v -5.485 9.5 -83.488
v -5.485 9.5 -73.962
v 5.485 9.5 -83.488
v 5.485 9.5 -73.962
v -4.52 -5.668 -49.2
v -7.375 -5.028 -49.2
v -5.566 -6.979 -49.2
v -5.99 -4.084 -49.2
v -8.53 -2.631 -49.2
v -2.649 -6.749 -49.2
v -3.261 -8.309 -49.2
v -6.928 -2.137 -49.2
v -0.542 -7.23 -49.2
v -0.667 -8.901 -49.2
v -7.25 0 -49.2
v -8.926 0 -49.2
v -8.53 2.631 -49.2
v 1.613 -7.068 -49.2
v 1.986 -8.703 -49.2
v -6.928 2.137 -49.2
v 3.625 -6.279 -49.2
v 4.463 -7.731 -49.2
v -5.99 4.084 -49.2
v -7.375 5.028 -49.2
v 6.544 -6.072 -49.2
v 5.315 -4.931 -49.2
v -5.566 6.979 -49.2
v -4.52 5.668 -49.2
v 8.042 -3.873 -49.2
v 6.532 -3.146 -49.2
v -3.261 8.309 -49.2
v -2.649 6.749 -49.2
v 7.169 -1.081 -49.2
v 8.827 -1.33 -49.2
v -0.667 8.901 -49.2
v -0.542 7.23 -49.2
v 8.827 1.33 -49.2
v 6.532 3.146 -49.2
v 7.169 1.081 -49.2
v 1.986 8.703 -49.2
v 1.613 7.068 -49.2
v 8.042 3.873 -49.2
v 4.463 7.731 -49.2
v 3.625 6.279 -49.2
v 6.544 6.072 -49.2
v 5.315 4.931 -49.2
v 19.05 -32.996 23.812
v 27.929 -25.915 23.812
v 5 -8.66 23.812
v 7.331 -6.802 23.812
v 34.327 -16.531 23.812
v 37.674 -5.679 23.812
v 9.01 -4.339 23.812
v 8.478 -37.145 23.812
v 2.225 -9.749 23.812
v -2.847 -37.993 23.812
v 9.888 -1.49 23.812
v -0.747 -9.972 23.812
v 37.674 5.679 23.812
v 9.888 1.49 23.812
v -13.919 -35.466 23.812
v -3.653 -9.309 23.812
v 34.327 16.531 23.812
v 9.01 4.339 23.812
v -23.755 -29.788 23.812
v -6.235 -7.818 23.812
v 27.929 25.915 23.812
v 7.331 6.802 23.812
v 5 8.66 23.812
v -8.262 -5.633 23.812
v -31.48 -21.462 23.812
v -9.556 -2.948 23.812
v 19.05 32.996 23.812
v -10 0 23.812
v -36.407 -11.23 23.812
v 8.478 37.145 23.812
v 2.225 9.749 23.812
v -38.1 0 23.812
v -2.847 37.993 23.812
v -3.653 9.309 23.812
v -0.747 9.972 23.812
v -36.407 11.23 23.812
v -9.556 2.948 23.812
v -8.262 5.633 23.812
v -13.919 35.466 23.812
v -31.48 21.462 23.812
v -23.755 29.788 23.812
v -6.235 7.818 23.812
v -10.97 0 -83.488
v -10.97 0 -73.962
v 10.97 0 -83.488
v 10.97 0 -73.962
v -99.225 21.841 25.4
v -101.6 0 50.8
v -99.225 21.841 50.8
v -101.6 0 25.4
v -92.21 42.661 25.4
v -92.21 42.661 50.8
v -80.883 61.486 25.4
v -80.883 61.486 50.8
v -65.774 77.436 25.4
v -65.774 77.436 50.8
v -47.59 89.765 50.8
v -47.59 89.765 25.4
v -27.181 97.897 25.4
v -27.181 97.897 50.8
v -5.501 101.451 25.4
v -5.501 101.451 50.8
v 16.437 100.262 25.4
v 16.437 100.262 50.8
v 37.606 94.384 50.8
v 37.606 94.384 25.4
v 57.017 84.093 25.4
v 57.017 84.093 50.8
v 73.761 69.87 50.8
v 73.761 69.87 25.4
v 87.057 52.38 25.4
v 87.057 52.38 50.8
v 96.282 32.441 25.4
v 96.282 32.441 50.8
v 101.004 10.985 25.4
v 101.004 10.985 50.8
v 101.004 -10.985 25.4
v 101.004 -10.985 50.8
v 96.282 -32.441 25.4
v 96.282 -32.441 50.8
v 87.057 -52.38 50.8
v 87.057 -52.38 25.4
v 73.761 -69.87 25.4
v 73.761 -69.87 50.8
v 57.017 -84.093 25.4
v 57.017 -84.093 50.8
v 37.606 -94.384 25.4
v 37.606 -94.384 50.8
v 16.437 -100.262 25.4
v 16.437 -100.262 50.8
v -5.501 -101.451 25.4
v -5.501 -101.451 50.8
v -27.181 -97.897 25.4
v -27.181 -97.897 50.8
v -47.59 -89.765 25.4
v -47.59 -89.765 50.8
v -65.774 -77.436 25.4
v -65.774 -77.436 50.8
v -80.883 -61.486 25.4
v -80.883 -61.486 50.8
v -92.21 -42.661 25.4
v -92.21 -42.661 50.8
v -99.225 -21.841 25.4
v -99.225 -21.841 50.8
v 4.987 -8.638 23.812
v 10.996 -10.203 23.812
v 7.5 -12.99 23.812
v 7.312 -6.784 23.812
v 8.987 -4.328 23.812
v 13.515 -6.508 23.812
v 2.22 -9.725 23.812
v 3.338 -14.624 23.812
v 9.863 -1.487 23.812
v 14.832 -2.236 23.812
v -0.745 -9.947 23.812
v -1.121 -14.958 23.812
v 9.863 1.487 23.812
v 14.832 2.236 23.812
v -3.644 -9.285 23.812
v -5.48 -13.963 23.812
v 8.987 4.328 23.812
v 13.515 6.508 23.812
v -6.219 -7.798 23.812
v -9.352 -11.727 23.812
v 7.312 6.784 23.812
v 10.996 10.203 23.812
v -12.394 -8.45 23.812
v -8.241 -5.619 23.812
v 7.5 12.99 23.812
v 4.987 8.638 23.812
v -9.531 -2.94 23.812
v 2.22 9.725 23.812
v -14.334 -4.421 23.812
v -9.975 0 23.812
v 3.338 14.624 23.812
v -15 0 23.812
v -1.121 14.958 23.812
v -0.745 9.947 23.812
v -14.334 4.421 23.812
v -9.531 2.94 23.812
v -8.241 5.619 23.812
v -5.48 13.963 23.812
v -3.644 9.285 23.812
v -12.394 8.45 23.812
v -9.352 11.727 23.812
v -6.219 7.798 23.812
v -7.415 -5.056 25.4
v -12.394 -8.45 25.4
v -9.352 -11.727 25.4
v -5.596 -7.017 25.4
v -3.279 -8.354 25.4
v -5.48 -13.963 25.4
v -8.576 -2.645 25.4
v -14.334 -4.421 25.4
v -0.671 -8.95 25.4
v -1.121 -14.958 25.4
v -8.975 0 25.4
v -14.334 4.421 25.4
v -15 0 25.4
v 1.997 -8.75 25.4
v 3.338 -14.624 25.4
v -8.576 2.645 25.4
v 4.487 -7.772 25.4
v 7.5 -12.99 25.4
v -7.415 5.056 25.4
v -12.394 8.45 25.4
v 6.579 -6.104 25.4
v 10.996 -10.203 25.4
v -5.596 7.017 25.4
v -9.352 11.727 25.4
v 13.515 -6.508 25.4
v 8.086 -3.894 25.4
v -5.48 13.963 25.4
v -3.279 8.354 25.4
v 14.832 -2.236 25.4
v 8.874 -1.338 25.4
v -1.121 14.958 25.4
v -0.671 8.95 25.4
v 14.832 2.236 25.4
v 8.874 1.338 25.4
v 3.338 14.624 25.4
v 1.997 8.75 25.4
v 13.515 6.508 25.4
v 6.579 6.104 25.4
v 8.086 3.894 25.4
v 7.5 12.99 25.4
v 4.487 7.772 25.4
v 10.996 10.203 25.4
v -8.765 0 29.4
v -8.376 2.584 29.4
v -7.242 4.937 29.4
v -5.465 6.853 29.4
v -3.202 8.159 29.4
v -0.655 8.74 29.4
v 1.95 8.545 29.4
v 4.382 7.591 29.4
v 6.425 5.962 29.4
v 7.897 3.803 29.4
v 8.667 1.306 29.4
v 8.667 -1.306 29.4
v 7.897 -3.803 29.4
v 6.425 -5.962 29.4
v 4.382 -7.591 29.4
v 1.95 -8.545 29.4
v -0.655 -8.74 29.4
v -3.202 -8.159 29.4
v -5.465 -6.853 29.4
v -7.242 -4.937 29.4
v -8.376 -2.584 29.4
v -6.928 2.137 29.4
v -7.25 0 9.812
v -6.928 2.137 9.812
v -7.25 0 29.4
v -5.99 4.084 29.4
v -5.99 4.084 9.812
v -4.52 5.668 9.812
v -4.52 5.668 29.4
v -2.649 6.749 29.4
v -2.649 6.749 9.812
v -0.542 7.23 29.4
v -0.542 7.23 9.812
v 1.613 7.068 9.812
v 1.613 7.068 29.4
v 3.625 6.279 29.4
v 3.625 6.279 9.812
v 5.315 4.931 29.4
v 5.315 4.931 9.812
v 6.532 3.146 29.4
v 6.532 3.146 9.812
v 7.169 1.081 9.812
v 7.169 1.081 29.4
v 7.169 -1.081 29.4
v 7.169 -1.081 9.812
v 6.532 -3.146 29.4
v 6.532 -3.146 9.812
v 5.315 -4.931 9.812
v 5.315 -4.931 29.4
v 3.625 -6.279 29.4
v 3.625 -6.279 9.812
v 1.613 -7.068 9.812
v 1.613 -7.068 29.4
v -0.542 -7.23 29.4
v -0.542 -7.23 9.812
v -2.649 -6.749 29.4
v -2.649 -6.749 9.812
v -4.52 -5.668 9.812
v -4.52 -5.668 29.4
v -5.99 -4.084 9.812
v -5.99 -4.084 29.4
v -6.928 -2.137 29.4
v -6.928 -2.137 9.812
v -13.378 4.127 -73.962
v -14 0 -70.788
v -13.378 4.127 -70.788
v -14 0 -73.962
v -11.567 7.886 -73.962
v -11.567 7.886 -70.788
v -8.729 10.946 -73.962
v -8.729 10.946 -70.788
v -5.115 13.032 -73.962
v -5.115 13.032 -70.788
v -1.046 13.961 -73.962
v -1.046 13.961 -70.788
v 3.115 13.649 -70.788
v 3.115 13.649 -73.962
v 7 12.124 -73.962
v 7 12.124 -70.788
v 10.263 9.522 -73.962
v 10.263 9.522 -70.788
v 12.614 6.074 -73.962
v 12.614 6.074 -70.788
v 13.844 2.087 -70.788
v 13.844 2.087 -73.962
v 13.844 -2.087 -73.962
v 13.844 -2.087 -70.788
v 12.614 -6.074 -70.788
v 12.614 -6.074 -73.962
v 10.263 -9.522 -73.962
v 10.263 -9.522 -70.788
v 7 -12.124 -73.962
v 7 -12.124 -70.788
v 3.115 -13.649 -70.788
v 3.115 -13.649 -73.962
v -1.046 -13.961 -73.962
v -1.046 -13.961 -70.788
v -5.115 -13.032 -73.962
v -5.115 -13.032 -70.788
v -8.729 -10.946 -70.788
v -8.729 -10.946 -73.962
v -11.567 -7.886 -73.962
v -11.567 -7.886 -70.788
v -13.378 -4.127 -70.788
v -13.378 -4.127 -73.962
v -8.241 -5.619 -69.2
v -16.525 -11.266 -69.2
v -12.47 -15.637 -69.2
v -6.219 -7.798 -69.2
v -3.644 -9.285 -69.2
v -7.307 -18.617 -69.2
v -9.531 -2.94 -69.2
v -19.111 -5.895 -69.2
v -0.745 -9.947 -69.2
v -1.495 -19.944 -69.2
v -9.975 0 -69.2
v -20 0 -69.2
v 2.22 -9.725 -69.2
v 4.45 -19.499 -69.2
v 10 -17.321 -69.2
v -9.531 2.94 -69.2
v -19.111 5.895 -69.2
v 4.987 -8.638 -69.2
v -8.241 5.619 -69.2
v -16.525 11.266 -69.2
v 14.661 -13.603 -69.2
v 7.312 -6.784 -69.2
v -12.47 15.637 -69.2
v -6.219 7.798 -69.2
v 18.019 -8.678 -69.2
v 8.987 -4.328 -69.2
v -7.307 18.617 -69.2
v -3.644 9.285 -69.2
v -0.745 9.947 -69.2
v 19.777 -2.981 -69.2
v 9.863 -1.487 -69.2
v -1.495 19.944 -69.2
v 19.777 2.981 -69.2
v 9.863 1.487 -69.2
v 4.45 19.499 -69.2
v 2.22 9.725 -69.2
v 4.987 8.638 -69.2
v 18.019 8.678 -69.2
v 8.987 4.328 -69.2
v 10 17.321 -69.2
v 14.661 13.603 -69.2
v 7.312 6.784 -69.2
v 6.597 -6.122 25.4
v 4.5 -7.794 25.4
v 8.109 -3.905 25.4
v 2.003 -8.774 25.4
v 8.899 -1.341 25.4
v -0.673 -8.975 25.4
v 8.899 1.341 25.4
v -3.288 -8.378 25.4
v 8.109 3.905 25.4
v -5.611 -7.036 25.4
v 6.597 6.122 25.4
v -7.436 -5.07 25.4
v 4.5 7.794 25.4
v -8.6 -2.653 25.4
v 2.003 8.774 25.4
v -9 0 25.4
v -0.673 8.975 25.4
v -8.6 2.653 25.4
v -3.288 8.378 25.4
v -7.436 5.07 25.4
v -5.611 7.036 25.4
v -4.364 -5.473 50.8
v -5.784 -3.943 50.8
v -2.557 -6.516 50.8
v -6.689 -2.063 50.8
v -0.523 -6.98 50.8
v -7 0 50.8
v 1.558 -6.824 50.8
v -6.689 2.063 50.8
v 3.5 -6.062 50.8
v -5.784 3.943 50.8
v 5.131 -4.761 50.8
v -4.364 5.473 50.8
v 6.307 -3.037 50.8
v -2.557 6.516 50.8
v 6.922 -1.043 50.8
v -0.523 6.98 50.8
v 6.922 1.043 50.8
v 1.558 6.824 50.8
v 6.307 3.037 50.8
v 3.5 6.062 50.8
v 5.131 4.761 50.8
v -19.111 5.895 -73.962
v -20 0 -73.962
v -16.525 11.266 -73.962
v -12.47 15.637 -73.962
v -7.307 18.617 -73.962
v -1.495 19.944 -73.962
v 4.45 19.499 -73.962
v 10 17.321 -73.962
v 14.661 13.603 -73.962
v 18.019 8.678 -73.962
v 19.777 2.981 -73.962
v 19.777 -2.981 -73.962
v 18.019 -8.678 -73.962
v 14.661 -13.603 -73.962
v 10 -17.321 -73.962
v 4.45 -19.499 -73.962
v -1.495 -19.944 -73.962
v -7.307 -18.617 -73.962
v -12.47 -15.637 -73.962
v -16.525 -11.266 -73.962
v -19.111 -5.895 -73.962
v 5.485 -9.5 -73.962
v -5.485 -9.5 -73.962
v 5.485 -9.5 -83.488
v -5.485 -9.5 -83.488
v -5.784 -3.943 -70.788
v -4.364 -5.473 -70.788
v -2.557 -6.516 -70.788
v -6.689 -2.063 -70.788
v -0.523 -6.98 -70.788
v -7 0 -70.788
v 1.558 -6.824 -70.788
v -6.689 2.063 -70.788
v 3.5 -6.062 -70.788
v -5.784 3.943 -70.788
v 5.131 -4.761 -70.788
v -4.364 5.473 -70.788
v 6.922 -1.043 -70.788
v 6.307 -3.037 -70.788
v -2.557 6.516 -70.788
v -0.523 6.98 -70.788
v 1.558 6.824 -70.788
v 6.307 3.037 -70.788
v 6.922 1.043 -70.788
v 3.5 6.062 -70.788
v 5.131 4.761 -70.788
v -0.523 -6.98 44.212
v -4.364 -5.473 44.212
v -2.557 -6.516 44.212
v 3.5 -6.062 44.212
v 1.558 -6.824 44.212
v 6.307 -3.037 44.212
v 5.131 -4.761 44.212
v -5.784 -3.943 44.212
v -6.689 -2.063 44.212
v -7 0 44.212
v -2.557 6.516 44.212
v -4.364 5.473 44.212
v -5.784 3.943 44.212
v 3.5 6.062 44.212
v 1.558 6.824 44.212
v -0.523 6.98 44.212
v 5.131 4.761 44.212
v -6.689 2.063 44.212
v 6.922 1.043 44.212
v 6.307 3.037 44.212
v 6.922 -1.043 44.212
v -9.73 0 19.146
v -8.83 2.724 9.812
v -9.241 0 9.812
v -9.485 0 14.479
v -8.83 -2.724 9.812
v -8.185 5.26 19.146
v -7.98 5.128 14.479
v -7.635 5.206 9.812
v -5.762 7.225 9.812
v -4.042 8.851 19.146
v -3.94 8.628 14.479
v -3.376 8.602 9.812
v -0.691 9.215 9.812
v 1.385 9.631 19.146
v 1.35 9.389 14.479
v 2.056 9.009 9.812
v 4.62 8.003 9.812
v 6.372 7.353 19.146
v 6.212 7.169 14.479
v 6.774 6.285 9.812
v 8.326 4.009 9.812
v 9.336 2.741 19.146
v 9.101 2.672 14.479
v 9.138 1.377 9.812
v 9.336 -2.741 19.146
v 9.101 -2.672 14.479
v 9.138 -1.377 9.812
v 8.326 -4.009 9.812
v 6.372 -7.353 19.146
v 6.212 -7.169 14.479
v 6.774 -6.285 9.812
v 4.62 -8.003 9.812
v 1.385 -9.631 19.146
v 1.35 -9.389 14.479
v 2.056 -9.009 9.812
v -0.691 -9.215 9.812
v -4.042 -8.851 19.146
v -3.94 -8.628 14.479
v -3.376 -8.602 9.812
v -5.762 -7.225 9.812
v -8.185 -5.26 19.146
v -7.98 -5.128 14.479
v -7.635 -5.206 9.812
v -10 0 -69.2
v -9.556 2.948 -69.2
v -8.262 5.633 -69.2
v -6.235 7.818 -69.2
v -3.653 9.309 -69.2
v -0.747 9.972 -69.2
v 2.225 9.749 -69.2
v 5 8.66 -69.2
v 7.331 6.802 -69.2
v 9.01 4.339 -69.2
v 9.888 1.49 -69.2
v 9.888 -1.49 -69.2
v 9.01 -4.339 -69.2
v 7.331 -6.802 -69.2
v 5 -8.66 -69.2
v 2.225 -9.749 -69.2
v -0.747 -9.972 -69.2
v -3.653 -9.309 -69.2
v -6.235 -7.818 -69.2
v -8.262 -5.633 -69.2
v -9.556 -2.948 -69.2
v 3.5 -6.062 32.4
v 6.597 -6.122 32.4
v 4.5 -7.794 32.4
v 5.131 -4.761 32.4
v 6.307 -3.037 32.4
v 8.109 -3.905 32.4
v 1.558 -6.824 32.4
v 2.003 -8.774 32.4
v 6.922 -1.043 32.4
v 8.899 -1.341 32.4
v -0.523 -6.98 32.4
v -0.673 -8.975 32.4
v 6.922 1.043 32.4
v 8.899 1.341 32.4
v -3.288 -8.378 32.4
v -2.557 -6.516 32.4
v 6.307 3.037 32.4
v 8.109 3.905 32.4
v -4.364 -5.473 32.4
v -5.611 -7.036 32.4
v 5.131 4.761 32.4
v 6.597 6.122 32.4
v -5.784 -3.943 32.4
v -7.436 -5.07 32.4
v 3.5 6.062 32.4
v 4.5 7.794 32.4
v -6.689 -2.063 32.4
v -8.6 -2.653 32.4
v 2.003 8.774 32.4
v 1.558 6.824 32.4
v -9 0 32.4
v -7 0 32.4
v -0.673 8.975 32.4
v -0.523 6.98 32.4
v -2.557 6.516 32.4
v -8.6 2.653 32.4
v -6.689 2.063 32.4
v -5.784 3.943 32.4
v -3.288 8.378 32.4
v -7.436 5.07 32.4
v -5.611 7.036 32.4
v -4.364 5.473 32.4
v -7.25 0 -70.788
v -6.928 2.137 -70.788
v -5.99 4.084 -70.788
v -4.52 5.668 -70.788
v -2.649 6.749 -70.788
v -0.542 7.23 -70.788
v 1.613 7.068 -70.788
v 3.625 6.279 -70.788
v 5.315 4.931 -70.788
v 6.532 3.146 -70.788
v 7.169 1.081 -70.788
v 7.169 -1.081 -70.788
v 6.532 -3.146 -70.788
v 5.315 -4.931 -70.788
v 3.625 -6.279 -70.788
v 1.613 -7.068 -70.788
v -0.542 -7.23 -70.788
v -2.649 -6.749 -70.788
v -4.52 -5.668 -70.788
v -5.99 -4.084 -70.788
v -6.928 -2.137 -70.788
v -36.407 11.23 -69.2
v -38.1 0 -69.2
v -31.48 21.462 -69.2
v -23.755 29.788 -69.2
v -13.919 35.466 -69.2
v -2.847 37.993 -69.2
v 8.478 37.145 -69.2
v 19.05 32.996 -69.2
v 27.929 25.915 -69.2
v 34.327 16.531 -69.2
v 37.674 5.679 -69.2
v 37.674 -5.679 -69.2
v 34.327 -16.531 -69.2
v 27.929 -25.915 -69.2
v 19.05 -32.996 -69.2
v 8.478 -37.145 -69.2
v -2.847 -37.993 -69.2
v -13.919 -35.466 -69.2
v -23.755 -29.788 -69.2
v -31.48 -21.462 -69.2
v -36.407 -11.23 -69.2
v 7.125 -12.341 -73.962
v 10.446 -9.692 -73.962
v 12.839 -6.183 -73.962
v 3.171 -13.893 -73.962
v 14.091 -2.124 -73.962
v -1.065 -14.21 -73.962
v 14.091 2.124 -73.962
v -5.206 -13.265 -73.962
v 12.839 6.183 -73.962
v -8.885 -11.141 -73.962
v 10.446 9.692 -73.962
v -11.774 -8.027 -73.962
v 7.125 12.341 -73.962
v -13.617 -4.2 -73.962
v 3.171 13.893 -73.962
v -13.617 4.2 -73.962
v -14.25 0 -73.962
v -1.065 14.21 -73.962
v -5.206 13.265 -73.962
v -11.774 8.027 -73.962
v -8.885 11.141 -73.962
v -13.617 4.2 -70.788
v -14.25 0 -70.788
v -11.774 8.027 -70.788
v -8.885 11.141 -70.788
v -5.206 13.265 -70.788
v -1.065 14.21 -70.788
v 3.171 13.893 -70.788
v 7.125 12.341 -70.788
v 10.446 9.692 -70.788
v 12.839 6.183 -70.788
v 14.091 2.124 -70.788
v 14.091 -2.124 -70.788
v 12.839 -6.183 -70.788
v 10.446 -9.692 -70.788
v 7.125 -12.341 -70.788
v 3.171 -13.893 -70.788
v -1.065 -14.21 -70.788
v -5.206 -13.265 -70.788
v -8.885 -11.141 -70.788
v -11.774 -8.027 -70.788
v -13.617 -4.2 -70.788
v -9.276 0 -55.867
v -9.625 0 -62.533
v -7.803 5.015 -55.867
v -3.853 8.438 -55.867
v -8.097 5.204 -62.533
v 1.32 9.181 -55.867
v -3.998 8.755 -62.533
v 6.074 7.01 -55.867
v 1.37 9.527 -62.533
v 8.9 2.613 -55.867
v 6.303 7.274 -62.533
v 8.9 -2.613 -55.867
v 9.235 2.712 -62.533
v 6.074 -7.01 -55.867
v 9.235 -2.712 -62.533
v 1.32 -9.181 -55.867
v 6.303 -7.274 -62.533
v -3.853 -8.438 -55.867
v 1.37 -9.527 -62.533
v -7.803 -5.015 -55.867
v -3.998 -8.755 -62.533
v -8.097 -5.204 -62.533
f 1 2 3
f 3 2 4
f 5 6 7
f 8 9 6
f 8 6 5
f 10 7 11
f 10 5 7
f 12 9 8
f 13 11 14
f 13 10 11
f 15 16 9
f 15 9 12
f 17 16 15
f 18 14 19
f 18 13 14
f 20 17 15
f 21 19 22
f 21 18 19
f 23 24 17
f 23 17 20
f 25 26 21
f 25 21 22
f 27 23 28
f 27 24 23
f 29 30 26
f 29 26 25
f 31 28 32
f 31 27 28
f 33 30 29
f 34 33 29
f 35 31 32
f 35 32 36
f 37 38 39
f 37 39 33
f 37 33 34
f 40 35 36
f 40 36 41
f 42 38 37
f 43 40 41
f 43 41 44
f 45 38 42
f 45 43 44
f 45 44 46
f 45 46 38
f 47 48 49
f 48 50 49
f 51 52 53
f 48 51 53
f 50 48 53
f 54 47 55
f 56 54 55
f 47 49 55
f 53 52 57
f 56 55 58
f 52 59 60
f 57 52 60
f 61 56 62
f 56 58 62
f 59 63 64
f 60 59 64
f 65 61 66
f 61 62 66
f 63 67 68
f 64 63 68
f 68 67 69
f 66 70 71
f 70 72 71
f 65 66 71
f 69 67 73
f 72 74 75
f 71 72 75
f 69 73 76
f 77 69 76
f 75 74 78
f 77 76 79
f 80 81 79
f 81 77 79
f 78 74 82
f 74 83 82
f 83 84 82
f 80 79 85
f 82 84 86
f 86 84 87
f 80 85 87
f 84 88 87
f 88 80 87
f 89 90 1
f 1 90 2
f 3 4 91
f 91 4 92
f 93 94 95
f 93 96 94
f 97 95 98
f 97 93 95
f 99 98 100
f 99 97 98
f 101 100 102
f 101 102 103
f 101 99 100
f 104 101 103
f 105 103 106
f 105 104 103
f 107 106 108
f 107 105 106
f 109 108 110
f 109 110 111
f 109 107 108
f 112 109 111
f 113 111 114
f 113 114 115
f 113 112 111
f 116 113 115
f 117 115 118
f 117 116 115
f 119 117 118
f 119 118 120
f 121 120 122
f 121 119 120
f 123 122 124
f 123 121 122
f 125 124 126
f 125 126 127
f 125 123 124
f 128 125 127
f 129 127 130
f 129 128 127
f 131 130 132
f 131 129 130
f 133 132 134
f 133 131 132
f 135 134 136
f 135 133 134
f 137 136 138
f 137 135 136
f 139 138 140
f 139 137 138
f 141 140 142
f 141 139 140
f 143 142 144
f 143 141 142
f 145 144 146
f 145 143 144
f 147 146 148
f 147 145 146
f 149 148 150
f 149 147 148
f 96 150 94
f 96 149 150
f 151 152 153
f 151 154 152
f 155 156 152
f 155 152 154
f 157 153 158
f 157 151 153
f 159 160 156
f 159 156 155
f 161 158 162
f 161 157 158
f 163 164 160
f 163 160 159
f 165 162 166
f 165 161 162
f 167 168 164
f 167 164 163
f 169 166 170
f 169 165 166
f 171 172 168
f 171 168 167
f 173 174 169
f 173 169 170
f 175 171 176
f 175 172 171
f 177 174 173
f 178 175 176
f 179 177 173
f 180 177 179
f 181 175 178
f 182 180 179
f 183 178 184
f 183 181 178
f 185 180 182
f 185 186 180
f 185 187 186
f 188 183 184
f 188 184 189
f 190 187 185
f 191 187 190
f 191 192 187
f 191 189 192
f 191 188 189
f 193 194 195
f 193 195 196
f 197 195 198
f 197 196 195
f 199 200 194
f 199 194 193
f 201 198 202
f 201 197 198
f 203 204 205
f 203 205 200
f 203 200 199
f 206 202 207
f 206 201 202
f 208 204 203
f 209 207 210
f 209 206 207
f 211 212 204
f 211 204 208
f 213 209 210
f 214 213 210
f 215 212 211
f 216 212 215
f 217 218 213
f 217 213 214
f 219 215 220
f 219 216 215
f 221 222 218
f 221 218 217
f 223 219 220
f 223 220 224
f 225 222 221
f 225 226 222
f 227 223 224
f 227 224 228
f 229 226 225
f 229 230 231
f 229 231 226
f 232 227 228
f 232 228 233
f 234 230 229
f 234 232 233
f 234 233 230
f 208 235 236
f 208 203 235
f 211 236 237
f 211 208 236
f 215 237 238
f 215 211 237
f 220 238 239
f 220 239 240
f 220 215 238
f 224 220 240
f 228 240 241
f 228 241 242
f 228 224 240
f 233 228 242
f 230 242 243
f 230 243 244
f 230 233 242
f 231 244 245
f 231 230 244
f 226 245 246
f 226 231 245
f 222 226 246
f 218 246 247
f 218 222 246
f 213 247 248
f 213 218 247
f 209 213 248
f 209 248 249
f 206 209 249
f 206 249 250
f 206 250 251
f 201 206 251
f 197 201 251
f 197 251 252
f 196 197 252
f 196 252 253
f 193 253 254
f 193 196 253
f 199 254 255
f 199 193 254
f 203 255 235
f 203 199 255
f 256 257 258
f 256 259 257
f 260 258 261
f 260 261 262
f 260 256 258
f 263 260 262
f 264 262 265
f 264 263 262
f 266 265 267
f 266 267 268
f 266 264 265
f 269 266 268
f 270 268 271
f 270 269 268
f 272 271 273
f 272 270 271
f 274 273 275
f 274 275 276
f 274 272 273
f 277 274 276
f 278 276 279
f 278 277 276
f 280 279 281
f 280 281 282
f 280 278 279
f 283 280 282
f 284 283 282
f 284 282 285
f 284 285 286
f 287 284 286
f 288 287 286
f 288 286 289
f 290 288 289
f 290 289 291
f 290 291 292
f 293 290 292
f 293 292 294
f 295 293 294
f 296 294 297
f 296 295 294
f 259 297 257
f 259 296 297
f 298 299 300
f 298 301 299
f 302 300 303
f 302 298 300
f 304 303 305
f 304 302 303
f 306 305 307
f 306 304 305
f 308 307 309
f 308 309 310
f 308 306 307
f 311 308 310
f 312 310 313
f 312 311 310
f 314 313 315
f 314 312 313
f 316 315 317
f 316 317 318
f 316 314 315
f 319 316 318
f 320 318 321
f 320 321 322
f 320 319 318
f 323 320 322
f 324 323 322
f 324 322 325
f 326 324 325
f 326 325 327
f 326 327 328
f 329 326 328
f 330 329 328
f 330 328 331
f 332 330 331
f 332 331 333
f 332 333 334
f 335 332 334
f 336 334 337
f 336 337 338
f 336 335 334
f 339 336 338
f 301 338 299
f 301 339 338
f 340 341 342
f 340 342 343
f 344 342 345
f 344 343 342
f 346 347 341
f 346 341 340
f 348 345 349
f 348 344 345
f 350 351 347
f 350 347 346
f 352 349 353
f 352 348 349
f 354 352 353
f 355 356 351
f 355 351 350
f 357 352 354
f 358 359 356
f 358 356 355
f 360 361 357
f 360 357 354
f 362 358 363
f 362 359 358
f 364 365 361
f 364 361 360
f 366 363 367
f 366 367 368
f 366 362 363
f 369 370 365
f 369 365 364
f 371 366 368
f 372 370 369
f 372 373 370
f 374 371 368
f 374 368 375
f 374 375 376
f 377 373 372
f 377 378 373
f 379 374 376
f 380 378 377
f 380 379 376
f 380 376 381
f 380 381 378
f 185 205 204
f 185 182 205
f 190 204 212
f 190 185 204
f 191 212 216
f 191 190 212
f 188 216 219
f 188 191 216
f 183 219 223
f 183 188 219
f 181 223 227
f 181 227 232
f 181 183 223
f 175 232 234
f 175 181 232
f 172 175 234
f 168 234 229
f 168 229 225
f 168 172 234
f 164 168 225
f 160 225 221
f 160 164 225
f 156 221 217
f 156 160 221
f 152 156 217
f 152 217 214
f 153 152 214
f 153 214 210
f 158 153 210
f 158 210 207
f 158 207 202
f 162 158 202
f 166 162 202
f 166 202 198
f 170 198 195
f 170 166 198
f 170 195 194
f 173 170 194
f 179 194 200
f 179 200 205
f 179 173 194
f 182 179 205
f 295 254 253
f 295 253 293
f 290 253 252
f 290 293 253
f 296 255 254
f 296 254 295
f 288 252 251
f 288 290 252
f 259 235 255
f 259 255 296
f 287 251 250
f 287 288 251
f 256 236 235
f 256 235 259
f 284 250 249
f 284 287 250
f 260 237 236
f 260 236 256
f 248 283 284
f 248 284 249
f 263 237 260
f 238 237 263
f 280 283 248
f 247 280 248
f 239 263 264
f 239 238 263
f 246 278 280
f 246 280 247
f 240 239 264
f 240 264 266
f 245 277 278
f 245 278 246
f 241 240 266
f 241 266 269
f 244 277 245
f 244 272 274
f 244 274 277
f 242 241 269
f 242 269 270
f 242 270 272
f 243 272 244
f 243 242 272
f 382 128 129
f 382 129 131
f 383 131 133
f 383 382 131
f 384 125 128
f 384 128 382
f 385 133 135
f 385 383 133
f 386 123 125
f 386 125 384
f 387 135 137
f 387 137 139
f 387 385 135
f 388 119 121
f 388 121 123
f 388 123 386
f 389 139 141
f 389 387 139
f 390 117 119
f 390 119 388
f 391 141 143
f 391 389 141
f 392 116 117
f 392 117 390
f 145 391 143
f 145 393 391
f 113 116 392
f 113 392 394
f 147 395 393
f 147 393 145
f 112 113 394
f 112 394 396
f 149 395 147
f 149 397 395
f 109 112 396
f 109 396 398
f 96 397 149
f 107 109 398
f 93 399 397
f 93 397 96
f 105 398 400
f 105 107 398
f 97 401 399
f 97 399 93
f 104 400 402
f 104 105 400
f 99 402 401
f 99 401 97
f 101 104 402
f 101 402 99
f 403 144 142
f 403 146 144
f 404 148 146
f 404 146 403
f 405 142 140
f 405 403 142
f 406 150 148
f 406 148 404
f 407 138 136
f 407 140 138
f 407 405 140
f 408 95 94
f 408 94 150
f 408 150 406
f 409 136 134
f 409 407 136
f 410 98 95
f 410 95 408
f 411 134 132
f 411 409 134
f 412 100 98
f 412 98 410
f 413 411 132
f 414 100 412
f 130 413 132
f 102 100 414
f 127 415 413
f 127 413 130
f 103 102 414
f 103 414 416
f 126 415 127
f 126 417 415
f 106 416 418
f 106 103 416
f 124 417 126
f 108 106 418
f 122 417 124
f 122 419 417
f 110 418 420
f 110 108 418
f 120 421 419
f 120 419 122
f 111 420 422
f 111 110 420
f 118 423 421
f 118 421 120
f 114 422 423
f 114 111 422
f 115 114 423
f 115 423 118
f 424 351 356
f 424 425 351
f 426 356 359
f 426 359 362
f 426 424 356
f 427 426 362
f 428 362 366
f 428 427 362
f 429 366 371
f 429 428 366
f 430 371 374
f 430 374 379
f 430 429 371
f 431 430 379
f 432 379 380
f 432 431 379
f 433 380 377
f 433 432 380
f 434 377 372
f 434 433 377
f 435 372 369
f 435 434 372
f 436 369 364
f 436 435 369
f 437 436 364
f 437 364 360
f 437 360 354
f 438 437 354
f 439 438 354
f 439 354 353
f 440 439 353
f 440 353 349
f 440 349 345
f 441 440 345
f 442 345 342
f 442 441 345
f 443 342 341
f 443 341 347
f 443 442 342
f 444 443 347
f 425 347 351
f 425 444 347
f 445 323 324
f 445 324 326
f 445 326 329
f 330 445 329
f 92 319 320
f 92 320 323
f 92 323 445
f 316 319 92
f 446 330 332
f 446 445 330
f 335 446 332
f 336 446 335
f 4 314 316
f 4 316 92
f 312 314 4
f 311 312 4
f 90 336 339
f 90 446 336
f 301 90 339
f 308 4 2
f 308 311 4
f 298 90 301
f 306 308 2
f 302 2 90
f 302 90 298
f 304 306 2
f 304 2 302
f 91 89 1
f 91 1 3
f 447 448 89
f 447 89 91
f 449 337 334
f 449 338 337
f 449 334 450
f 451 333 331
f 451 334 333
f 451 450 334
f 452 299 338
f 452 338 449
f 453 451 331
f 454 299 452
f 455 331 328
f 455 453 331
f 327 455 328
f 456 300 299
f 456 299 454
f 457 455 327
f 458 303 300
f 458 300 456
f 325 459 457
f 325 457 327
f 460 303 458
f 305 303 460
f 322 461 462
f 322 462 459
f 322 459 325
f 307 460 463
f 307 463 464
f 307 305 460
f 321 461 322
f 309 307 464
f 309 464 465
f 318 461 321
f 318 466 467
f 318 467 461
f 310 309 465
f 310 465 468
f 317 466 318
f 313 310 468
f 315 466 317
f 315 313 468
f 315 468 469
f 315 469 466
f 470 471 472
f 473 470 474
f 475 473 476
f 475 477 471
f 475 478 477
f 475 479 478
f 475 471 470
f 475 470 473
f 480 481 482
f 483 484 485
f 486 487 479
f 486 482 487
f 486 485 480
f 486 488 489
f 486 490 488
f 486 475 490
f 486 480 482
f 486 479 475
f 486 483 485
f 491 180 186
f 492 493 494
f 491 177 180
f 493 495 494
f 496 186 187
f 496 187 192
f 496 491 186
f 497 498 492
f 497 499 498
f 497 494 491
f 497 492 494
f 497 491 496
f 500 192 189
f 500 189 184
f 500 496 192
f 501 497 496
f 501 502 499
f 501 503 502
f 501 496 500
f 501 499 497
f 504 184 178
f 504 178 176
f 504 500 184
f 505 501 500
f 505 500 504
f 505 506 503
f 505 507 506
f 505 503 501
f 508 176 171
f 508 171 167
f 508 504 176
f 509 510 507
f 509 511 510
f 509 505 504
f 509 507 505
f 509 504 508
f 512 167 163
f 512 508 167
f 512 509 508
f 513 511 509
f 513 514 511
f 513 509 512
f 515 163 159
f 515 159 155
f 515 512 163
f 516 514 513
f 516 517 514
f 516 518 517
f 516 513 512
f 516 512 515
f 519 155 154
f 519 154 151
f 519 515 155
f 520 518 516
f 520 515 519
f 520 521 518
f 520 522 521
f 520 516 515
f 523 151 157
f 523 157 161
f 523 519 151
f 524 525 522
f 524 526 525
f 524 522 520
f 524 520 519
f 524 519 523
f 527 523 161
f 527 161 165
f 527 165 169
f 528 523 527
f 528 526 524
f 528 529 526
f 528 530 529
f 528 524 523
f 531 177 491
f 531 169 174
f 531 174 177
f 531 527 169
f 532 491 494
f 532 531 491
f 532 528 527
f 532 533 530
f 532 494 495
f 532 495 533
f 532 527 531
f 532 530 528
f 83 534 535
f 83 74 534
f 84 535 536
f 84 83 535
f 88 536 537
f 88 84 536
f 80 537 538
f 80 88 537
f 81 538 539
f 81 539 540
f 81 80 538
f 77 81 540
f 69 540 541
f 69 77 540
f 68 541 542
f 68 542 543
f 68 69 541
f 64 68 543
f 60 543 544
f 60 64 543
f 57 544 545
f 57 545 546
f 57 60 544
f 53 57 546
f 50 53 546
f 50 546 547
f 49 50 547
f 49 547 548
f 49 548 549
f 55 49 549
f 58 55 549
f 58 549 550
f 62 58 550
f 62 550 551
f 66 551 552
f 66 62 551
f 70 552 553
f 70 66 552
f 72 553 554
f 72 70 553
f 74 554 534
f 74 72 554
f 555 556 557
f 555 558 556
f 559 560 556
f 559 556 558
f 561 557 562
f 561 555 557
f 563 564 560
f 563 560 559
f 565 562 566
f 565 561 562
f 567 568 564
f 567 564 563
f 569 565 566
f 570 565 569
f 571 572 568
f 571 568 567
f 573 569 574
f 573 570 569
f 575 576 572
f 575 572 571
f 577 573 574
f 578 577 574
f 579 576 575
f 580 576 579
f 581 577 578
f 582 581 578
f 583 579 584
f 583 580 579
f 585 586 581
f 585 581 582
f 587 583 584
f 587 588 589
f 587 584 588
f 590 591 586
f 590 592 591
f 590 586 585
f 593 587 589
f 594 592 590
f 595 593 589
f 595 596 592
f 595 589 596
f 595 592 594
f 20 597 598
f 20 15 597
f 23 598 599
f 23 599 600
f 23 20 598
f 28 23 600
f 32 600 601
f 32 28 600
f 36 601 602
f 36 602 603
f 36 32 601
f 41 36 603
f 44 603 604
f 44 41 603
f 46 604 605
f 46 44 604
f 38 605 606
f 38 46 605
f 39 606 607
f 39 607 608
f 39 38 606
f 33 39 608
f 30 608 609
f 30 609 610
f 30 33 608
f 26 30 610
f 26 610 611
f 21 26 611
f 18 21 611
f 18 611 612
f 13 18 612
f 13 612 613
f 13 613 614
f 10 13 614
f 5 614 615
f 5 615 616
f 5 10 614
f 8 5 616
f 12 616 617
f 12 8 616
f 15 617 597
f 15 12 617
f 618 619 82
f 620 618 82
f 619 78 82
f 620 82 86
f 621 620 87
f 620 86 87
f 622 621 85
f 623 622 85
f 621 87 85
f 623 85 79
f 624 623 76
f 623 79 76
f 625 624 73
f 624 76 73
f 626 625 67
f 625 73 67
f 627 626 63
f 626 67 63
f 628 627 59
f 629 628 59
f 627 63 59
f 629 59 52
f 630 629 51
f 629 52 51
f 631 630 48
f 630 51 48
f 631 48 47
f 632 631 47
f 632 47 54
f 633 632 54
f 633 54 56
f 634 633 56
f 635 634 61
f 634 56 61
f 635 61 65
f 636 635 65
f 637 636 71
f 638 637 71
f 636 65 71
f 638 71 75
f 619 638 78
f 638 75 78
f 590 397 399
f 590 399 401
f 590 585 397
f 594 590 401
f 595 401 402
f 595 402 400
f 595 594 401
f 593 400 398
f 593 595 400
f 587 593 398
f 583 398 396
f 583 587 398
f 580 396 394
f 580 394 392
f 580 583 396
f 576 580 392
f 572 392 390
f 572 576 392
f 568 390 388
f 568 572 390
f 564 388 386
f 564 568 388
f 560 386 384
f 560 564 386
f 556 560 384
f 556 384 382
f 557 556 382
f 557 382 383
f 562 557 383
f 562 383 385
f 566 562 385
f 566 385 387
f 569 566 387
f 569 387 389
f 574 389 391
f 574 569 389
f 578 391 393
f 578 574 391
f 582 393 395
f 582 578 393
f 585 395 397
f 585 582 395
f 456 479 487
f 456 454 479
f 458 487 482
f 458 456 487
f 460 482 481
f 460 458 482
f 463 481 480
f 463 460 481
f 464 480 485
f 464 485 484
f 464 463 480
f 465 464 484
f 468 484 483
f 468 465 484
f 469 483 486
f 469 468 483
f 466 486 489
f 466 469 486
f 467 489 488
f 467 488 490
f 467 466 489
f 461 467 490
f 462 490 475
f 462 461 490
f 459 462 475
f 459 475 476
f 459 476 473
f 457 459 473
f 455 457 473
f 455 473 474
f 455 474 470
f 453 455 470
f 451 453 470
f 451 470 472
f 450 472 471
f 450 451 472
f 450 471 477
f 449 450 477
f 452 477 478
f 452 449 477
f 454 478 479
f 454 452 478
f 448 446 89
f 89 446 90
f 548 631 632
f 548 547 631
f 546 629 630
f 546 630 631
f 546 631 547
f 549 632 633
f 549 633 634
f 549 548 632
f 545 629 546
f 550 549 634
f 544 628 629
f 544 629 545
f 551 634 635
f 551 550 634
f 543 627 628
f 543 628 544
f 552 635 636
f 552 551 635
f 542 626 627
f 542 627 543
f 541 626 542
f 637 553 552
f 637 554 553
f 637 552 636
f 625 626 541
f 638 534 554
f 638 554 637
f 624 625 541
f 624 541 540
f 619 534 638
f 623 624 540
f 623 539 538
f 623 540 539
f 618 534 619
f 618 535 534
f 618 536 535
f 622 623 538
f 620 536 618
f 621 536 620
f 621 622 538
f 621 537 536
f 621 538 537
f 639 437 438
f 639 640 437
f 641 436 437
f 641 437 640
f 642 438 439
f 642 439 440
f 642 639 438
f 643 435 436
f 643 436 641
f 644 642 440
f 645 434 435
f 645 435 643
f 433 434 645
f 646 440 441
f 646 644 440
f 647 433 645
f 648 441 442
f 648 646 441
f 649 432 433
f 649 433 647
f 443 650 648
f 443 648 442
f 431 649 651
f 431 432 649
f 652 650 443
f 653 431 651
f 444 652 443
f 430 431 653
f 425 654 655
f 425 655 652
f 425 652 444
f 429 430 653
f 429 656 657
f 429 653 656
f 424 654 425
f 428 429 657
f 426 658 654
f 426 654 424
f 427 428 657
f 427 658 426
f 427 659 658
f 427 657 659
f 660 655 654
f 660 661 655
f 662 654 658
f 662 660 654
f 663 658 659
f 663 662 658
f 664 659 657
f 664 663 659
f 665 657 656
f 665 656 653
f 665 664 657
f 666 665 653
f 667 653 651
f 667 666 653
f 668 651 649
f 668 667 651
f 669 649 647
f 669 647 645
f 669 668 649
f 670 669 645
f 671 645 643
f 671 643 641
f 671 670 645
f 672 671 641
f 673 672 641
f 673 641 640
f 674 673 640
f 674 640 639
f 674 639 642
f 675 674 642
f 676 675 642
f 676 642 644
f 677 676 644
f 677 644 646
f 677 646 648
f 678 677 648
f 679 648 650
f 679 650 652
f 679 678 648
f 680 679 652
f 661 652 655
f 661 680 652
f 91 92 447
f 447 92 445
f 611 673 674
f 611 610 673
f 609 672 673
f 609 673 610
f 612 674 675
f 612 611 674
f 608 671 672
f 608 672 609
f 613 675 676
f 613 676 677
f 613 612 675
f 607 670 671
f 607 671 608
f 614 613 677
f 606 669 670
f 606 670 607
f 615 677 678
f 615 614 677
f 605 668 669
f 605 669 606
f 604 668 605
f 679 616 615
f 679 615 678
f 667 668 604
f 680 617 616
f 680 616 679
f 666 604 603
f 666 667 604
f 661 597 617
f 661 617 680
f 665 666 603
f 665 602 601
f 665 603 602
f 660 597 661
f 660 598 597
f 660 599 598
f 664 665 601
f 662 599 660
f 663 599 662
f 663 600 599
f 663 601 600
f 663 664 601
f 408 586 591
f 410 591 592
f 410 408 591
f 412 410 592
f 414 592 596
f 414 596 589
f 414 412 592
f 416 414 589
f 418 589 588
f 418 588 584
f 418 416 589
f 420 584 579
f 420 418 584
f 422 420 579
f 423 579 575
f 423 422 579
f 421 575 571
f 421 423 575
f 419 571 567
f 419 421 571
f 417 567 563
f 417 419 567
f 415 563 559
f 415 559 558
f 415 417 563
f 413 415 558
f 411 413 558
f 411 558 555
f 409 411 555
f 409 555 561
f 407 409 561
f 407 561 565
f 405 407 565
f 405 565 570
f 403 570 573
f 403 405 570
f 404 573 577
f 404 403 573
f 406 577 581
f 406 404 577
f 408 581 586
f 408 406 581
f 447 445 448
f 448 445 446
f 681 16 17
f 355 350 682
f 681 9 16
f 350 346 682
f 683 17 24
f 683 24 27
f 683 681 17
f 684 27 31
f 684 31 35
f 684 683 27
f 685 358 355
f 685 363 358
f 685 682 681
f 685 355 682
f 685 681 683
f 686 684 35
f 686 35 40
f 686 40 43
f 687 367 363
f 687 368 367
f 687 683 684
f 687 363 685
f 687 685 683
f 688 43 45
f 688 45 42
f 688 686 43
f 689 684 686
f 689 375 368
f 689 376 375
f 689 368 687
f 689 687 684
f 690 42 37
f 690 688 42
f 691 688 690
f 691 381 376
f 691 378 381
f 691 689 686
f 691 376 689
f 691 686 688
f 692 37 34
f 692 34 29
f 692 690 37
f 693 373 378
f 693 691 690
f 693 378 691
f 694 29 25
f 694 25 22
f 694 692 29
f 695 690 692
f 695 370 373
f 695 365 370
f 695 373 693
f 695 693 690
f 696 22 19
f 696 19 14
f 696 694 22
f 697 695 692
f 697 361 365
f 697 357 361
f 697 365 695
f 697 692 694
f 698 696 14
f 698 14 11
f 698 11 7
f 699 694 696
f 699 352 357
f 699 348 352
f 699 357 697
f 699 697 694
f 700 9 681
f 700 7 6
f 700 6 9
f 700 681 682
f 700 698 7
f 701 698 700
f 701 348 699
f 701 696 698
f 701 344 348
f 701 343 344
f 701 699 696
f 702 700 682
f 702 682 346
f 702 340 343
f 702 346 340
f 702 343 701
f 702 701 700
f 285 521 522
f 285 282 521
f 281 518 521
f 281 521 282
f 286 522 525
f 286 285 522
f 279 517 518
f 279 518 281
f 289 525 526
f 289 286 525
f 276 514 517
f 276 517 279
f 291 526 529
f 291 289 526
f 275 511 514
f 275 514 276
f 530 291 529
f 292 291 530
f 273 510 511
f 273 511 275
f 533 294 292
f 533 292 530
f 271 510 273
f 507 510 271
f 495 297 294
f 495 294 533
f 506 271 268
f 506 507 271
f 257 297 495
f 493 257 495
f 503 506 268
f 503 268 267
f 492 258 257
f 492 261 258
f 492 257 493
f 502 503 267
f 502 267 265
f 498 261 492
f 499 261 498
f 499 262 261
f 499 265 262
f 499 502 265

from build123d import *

# Parameters (mm, degrees)
F2_W     = 28.1
F2_H     = 93.0125
F7_DEPTH = 9.525


with BuildPart() as f1:
    # F0 (on Front) → F1 (revolve)
    with BuildSketch(Plane.XZ):
        Polygon((-7, 50.8), (-101.6, 50.8), (-101.6, 25.4), (-9, 25.4), (-9, 32.4), (-7, 32.4), align=None)
    revolve(axis=Axis((0, 0, 0), (0, 0, -1)))


with BuildPart() as f3:
    # F2 (on Front) → F3 (revolve)
    with BuildSketch(Plane.XZ):
        with Locations((-24.05, -22.69375)):
            Rectangle(F2_W, F2_H)
    revolve(axis=Axis((0, 0, 0), (0, 0, -1)))


with BuildPart() as f5:
    # F4 (on Front) → F5 (revolve)
    with BuildSketch(Plane.XZ):
        Polygon((0, -73.9625), (0, 44.2125), (-7, 44.2125), (-7, -70.7875), (-14, -70.7875), (-14, -73.9625), align=None)
    revolve(axis=Axis((0, 0, -14.875), (0, 0, -1)))

    # F6 (on face) → F7 (join)
    with BuildSketch(Plane(origin=(0, 0, -73.9625), x_dir=(1, 0, 0), z_dir=(0, 0, -1))):
        Polygon((5.484828, 9.5), (-5.484828, 9.5), (-10.969655, 0), (-5.484828, -9.5), (5.484828, -9.5), (10.969655, 0), align=None)
    extrude(amount=F7_DEPTH)


with BuildPart() as f9:
    # F8 (on Front) → F9 (revolve)
    with BuildSketch(Plane.XZ):
        Polygon((-7.25, 9.8125), (-7.25, 29.4), (-8.764969, 29.4), (-8.9746, 25.4), (-15, 25.4), (-15, 23.8125), (-10, 23.8125), (-9.9746, 23.8125), (-9.240891, 9.8125), align=None)
    revolve(axis=Axis((0, 0, 0), (0, 0, -1)))


with BuildPart() as f11:
    # F10 (on Front) → F11 (revolve)
    with BuildSketch(Plane.XZ):
        Polygon((-8.926444, -49.2), (-9.9746, -69.2), (-20, -69.2), (-20, -73.9625), (-14.25, -73.9625), (-14.25, -70.7875), (-7.25, -70.7875), (-7.25, -49.2), align=None)
    revolve(axis=Axis((0, 0, -14.875), (0, 0, -1)))


solid = Compound([f1.part, f3.part, f5.part, f9.part, f11.part])
